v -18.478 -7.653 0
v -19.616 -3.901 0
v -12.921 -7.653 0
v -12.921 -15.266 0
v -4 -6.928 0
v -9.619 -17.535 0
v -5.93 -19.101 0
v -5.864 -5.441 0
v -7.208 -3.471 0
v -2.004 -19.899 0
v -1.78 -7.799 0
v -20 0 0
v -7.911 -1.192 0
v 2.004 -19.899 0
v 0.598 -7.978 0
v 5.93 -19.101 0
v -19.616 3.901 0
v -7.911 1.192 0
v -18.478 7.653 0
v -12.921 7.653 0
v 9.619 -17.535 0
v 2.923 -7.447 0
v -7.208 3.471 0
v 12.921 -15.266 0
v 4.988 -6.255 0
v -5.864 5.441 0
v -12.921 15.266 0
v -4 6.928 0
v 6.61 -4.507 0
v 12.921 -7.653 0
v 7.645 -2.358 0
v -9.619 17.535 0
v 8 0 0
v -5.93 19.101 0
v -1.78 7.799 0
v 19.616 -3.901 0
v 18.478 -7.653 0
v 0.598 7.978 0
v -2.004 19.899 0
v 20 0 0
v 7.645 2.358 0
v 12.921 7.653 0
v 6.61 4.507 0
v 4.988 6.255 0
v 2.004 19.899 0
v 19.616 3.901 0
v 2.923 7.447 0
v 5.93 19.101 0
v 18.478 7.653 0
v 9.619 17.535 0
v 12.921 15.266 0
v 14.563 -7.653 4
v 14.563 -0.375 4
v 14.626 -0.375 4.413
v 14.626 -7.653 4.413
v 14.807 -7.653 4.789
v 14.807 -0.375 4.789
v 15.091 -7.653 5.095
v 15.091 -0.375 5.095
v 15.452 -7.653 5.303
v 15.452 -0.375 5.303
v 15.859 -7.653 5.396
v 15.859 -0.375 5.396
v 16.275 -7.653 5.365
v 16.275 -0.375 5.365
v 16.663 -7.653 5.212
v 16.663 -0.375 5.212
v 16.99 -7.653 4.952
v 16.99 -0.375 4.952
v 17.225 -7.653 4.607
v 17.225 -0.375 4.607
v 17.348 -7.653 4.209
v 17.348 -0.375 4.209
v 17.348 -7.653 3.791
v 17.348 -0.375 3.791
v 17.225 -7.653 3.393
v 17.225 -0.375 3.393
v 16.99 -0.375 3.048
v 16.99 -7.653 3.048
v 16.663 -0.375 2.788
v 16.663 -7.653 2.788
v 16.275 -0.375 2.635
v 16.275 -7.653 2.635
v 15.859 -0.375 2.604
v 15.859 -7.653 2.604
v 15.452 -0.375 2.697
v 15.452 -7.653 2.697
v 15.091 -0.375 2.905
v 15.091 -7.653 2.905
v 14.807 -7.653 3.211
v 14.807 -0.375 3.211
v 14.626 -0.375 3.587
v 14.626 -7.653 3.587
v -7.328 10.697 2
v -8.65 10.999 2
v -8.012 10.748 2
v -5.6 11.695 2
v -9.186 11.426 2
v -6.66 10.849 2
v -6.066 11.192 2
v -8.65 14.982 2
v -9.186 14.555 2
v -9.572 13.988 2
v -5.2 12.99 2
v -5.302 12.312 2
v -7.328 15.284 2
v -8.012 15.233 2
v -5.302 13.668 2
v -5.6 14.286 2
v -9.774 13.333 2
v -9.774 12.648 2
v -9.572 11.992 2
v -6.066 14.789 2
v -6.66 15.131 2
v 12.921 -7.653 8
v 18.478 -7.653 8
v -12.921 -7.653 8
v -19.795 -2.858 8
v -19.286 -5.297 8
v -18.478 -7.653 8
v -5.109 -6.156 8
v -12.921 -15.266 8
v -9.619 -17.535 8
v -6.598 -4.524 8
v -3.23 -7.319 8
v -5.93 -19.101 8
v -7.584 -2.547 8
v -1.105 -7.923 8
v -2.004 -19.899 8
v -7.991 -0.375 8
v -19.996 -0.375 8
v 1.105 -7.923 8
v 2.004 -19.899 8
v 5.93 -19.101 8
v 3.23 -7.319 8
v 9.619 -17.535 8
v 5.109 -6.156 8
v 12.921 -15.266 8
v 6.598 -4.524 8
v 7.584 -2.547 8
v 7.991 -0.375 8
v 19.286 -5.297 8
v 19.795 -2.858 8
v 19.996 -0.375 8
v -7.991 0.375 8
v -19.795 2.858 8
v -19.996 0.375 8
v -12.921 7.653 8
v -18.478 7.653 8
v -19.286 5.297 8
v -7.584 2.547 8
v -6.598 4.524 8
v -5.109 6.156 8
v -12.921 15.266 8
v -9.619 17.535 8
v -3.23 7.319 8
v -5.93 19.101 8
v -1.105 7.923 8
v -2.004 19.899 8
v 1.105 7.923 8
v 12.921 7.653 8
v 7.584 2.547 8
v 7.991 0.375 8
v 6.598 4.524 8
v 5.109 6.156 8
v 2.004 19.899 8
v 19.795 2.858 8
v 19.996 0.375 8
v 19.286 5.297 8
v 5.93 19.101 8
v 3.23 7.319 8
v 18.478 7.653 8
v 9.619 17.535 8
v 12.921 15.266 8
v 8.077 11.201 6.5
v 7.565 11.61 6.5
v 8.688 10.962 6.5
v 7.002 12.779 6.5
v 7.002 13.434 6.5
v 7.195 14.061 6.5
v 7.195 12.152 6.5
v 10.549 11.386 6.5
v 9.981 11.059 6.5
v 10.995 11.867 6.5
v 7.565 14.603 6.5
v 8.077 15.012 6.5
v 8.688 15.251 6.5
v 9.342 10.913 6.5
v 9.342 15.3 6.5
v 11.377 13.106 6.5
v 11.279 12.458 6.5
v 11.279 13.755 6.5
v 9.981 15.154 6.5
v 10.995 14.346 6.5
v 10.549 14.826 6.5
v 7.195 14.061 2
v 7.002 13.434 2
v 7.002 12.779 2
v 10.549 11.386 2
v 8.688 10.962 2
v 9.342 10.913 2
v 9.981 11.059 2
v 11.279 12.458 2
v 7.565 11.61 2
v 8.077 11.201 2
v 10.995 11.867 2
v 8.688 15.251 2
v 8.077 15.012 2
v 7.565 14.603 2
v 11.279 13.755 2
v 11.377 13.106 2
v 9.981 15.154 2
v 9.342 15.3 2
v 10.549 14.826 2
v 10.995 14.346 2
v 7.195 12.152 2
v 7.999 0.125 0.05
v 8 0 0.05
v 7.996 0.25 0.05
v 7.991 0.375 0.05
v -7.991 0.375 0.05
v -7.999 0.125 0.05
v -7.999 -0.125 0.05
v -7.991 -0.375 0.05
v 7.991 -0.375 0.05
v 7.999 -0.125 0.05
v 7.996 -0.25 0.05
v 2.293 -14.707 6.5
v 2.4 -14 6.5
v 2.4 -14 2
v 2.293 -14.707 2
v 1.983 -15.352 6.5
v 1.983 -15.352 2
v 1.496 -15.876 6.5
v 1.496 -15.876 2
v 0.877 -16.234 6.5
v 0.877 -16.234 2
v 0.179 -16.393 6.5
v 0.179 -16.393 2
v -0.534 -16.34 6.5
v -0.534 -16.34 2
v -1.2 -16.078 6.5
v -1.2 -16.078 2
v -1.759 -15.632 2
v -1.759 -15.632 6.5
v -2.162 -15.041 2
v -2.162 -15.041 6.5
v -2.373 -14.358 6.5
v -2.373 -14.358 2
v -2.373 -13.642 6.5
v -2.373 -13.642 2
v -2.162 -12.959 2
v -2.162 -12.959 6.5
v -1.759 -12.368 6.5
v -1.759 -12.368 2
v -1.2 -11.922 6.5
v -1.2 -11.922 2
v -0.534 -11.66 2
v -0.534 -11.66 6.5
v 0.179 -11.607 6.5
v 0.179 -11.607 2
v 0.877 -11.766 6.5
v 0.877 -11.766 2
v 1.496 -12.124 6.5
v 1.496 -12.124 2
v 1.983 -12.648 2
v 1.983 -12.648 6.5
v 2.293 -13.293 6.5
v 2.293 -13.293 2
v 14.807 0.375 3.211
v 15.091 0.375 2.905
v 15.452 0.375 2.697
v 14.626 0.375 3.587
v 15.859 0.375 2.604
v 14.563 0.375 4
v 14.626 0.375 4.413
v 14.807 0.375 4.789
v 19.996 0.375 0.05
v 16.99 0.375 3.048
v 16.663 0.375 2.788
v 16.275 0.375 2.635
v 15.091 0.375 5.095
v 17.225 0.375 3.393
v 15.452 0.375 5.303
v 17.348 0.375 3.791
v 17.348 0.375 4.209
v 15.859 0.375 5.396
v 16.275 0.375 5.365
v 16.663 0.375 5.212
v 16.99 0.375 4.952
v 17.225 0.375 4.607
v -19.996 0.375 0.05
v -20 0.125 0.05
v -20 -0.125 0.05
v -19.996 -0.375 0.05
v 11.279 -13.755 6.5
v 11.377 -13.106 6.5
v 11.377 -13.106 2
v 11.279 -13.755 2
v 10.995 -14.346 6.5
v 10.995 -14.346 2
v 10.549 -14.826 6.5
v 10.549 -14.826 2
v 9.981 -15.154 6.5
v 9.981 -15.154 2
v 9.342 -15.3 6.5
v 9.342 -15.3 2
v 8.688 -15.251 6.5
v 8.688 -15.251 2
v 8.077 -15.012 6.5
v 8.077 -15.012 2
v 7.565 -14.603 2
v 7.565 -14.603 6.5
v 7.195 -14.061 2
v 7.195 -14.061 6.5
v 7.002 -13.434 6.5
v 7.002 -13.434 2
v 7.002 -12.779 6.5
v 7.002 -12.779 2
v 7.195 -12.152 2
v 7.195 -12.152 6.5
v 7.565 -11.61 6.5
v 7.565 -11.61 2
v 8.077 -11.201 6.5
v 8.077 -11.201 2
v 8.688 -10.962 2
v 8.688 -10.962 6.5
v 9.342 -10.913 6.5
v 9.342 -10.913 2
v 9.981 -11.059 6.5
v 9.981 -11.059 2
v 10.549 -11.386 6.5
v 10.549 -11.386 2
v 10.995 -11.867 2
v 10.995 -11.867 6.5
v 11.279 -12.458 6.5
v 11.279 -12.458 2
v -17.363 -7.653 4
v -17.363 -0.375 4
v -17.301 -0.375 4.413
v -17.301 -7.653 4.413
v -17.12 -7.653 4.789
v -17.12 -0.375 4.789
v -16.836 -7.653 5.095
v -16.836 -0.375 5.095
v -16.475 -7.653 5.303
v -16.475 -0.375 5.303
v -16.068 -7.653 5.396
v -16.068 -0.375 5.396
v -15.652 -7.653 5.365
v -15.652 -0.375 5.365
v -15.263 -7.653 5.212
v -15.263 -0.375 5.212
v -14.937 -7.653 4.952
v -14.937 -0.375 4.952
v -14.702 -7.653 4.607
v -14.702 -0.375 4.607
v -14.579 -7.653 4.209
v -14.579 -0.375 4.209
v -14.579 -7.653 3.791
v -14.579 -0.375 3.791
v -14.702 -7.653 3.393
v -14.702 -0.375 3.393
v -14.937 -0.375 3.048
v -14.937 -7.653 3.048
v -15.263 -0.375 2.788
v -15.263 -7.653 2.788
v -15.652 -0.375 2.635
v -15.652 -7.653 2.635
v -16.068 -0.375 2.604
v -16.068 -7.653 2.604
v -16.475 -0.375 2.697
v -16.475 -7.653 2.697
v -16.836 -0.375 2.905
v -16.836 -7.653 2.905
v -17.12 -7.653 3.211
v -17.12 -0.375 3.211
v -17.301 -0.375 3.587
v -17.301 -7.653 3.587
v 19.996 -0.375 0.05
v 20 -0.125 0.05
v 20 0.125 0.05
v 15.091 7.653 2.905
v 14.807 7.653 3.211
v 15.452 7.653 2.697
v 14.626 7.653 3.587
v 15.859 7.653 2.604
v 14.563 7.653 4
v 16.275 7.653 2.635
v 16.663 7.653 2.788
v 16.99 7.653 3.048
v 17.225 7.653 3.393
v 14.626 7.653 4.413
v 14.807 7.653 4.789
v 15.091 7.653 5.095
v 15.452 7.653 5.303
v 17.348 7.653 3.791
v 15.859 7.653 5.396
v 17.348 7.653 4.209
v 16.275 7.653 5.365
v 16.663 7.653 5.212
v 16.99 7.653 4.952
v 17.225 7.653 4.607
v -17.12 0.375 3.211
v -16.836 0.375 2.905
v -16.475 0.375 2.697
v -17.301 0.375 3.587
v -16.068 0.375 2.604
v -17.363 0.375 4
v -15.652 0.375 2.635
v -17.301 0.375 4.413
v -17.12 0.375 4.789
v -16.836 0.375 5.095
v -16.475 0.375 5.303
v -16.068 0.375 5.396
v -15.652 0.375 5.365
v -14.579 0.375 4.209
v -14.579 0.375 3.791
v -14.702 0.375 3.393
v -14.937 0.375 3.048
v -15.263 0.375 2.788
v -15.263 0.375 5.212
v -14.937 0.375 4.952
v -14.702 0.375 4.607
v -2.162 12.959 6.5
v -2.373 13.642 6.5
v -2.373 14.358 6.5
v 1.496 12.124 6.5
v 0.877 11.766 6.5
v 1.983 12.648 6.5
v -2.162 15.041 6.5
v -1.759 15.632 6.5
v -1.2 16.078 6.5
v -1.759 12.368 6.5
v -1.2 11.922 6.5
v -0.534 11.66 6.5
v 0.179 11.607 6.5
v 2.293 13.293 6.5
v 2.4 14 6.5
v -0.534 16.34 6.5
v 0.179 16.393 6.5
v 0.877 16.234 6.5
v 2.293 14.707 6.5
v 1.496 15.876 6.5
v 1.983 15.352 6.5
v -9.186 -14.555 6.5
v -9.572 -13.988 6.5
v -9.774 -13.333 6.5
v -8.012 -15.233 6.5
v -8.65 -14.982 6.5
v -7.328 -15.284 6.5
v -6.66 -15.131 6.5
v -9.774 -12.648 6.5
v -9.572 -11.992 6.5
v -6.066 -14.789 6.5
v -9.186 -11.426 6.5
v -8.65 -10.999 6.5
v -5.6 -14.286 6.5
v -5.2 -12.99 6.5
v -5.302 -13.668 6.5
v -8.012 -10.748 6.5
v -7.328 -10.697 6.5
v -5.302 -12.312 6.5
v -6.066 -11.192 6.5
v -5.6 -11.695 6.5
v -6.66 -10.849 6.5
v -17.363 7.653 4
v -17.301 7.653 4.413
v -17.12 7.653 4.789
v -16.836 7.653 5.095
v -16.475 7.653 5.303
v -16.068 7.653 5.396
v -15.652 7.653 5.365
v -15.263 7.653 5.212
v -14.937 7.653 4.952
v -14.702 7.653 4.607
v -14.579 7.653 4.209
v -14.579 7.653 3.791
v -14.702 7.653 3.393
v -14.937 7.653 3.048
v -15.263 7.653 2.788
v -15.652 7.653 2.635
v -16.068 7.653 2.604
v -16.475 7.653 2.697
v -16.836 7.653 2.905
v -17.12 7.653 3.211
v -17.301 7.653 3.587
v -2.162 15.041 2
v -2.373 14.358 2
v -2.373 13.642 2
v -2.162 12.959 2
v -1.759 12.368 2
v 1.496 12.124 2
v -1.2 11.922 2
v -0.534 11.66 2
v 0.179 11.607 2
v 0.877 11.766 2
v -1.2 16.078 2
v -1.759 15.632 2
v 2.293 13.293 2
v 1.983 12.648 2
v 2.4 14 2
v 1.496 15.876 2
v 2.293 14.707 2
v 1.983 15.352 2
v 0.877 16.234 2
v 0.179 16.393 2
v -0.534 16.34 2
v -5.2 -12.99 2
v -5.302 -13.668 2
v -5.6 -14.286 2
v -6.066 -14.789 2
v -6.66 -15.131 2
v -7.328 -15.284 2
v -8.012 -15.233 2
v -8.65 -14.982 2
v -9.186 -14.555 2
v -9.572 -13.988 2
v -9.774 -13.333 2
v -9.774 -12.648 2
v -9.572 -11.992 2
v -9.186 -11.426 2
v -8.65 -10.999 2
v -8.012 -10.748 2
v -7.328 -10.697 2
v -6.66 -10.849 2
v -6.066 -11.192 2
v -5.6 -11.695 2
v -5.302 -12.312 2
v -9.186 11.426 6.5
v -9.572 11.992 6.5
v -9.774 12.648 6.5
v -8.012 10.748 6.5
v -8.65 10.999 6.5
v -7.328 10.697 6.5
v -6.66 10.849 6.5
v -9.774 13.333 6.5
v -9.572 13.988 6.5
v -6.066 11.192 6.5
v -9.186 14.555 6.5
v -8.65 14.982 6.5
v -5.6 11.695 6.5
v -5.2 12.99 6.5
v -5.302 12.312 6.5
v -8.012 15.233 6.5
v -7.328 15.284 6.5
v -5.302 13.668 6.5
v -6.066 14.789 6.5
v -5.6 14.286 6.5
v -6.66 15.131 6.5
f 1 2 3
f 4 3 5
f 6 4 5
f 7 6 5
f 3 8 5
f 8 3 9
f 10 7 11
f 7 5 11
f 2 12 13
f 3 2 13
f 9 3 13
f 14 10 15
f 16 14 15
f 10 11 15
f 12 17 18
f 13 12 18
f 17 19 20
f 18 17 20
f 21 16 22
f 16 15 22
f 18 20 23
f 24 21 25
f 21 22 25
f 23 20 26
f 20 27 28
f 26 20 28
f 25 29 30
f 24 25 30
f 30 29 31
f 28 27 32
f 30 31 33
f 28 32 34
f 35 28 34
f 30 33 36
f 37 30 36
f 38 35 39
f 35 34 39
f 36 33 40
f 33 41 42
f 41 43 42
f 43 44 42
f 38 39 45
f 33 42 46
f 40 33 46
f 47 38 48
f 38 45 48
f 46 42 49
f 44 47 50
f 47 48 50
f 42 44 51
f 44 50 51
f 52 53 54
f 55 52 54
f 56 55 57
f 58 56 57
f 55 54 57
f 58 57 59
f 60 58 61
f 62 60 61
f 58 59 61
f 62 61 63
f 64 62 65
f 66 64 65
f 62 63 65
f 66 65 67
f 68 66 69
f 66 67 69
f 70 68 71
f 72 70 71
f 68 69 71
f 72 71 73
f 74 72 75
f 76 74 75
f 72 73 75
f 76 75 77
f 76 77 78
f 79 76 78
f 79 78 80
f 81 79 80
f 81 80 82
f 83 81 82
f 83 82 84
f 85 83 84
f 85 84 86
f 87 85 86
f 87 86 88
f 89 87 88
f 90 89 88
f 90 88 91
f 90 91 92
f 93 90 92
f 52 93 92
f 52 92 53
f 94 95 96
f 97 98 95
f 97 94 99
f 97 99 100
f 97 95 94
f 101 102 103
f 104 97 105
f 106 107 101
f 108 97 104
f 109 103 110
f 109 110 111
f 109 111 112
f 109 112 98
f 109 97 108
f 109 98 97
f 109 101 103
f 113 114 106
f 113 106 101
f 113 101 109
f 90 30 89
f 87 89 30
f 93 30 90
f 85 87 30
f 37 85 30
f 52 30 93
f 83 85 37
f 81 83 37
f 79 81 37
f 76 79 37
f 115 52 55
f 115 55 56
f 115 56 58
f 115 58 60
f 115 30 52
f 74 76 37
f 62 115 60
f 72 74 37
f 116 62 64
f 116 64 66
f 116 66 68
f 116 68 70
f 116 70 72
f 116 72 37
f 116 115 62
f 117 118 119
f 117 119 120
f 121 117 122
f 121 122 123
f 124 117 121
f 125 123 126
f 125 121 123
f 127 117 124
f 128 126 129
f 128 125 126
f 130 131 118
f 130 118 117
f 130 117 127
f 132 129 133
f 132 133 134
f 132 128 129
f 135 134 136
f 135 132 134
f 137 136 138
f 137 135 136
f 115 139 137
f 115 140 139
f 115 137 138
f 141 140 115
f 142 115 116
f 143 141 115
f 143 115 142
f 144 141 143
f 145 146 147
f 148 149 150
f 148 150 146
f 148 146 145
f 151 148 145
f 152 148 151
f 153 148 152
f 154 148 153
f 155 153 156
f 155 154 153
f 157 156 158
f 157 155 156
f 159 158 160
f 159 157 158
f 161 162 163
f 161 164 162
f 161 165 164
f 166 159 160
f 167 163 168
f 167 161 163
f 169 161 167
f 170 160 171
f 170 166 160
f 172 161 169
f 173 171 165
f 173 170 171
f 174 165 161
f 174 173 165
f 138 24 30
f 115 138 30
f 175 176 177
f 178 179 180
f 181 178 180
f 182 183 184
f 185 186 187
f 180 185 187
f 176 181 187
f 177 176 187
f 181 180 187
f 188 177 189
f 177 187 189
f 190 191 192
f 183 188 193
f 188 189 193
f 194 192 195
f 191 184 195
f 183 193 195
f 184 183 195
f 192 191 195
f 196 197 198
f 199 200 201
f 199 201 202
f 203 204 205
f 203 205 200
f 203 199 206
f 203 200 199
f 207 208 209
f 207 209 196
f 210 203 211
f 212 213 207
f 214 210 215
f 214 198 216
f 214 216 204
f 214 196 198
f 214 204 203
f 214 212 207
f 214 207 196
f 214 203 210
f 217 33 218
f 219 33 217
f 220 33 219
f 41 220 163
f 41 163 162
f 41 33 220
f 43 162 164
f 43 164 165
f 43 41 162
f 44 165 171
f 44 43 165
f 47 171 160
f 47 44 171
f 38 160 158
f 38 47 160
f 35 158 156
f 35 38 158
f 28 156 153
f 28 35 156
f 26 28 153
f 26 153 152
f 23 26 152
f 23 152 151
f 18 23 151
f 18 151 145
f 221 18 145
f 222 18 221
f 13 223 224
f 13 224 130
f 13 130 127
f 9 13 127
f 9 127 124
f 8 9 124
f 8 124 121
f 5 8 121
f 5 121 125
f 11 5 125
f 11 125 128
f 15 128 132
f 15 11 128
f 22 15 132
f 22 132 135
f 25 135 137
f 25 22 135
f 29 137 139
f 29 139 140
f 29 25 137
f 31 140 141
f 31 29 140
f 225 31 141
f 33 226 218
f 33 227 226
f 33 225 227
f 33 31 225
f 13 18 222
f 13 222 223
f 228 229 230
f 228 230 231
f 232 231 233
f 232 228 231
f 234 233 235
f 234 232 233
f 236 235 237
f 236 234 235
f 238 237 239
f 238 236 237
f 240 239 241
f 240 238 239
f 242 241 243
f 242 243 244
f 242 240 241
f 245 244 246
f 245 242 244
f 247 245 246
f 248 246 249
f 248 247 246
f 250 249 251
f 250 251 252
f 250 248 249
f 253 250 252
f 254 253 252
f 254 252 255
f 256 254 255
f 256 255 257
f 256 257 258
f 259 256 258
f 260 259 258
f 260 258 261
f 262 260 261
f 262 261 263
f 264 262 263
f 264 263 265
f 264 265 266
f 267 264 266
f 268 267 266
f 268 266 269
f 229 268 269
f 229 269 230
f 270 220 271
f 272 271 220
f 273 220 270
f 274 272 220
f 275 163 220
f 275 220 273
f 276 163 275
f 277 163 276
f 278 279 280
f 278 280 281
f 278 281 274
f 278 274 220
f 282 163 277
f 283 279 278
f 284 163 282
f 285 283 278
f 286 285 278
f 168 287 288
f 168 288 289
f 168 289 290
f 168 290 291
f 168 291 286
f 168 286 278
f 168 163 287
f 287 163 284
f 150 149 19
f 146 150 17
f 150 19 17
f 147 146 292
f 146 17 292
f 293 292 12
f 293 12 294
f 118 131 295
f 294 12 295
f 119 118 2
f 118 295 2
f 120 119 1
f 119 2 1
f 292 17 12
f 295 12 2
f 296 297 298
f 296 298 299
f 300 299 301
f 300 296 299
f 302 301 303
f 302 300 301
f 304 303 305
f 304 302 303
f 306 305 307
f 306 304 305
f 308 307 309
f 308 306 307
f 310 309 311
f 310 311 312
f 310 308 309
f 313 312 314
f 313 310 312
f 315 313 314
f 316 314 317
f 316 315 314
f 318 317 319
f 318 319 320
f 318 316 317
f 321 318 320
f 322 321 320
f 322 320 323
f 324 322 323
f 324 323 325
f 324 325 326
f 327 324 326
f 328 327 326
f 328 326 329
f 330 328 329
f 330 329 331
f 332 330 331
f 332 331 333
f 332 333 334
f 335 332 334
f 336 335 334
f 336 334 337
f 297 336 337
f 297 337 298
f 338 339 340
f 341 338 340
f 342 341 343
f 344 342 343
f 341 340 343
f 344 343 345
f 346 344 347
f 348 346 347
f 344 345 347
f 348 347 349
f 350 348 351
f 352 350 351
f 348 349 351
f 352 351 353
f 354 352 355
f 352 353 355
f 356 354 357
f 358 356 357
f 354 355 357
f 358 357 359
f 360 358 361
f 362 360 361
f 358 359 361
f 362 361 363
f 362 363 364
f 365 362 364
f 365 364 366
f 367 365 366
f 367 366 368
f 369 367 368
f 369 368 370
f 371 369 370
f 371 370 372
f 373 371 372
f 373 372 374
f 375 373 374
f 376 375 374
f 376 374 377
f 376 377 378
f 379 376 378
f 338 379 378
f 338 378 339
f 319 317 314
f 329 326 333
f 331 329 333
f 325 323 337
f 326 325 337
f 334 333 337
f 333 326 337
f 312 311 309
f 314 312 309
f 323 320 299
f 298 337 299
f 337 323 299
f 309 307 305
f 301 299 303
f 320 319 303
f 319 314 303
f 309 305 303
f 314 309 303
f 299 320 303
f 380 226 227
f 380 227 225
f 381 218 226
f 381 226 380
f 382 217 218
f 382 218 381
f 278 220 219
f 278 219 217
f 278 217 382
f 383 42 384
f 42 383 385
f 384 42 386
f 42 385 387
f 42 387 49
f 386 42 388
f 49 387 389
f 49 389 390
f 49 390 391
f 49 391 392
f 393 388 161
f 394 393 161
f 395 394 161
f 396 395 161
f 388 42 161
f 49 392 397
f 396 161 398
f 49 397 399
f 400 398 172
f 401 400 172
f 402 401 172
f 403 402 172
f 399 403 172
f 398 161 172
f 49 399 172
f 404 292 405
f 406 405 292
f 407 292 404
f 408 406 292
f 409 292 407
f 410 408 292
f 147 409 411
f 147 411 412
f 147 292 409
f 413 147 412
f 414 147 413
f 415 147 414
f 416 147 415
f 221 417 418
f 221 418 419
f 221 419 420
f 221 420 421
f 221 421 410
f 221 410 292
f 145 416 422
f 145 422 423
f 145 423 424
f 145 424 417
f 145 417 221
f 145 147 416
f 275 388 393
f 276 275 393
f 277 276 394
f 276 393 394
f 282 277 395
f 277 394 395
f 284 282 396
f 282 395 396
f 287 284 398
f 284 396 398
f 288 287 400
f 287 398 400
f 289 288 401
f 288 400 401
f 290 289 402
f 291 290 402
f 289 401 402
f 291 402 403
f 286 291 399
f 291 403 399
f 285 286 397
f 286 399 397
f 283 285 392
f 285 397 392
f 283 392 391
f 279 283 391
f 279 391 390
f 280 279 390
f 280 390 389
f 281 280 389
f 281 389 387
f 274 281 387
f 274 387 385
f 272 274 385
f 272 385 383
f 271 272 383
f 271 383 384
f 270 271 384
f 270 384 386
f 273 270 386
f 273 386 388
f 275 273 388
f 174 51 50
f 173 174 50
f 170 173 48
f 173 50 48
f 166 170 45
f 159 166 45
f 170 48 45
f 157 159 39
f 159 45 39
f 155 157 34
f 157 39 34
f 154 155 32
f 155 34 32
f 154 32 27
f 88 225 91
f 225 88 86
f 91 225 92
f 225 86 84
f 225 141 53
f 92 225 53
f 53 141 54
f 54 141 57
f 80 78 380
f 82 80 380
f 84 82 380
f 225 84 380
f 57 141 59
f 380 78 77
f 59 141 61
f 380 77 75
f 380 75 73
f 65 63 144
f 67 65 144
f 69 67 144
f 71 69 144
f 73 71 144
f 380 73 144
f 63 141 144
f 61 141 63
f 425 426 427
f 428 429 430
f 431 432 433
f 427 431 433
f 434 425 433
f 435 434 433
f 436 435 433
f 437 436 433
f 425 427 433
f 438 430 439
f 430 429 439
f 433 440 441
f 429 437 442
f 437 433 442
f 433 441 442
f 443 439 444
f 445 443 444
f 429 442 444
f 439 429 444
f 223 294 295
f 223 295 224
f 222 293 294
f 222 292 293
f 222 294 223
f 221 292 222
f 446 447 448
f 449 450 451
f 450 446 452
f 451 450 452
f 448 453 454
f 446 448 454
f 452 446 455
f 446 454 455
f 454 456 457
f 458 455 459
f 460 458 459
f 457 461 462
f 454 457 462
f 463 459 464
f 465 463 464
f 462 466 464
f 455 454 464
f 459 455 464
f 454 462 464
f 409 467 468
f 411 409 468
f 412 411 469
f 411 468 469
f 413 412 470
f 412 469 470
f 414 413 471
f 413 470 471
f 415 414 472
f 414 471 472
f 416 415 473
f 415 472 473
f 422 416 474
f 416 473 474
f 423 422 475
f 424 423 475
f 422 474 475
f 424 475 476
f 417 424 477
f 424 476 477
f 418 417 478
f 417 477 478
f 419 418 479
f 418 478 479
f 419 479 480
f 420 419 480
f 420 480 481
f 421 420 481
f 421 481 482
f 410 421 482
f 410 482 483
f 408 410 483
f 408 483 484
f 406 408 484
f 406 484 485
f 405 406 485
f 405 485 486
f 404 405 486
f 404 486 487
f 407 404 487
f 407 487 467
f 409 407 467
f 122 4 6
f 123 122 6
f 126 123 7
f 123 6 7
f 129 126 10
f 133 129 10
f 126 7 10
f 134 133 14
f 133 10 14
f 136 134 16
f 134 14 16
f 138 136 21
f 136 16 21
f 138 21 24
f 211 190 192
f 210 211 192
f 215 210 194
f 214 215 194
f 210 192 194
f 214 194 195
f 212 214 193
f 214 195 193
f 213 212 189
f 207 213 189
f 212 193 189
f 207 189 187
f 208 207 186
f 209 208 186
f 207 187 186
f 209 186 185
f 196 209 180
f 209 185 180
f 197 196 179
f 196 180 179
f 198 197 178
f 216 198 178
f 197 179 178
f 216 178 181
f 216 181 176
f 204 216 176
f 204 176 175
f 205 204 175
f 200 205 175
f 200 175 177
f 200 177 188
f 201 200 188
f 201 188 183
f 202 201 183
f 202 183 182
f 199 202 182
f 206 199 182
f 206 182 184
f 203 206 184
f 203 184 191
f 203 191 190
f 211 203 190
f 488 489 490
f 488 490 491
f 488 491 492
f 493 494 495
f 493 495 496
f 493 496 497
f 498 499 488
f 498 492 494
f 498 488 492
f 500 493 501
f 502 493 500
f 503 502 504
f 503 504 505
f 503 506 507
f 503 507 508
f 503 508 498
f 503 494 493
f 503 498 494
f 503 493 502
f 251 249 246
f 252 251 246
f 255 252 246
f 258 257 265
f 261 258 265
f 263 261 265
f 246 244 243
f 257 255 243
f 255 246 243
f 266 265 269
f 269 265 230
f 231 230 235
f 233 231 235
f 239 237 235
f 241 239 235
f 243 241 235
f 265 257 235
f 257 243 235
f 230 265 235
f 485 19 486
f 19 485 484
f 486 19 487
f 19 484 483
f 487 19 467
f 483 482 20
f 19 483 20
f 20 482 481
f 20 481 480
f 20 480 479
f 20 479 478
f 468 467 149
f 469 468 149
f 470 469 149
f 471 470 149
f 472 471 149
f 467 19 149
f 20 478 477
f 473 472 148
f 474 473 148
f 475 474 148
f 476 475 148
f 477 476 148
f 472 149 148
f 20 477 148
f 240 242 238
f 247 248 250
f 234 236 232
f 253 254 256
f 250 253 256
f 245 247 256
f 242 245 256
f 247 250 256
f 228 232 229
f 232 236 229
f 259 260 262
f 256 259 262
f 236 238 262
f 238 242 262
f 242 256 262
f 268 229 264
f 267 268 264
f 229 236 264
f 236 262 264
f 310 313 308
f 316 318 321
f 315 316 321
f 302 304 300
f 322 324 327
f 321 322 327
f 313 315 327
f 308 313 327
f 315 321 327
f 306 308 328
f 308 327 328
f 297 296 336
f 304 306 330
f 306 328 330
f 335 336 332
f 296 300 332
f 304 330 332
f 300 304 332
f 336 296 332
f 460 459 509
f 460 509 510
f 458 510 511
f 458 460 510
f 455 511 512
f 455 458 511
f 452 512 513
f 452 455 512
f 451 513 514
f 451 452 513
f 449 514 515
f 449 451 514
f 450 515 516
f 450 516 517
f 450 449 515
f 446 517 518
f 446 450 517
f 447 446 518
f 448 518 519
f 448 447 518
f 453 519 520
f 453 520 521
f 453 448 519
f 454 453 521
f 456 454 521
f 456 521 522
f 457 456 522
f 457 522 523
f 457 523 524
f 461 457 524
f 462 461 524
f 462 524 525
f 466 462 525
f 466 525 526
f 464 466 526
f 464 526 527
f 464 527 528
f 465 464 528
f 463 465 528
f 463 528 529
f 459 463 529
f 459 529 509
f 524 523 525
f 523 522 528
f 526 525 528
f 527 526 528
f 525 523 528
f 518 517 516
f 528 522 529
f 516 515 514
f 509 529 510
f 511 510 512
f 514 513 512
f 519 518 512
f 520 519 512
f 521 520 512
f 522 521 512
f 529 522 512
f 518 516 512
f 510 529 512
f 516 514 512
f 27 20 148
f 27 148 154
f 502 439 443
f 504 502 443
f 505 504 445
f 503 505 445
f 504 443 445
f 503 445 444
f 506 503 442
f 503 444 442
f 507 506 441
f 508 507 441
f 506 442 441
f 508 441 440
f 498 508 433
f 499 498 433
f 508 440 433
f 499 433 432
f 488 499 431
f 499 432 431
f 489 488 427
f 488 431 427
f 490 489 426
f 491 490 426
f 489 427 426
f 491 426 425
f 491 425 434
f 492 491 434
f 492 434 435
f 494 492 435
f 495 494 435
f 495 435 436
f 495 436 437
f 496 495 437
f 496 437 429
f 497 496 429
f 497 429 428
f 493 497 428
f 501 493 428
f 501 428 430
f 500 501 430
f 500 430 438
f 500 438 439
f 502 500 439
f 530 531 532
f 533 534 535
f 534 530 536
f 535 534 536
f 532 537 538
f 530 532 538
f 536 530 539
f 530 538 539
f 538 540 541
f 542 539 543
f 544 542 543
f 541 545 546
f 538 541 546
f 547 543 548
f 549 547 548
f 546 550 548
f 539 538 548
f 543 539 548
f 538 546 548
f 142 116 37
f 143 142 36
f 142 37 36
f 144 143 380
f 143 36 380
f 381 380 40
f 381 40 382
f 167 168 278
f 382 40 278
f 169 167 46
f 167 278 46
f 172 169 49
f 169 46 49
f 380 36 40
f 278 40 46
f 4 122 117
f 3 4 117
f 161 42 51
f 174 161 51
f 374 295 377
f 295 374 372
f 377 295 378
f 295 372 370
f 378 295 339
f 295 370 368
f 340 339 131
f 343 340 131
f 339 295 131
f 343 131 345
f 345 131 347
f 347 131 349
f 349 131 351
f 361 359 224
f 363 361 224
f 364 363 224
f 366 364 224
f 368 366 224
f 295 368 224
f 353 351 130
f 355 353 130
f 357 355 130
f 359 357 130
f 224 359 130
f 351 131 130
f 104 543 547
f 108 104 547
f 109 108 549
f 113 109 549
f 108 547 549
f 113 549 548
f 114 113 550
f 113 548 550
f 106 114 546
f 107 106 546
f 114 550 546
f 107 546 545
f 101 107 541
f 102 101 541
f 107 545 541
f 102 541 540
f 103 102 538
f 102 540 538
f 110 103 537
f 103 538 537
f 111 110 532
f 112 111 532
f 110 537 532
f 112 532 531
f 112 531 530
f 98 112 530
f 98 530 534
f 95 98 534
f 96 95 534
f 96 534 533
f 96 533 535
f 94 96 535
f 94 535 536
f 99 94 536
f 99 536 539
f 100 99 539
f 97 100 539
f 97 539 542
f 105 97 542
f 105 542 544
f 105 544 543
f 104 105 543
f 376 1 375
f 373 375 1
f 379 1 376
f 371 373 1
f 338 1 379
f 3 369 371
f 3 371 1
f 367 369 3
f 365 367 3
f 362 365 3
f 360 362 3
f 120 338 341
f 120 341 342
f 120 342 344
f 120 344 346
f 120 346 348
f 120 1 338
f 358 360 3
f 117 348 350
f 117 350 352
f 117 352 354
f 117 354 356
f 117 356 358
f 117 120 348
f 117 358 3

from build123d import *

# Parameters (mm, degrees)
SKETCH_R        = 20
SKETCH_R_2      = 8
PAD_DEPTH       = 8
SKETCH001_R     = 2.4
SKETCH001_R_2   = 2.3
SKETCH001_R_3   = 1.630743
SKETCH001_R_4   = 1.492514
SKETCH001_R_5   = 2.2
SKETCH001_R_6   = 1.821083
POCKET_DEPTH    = 6
SKETCH002_R     = 19.1322603564
SKETCH002_R_2   = 8.424409
PAD001_DEPTH    = 1.5
SKETCH003_W     = 43.022533
SKETCH003_H     = 0.75
POCKET001_DEPTH = 7.95
SKETCH007_W     = 7.6375744751
SKETCH007_H     = 10.86069433
SKETCH007_W_2   = 8.2446434751
SKETCH007_H_2   = 12.05515533
SKETCH007_W_3   = 8.5299164751
SKETCH007_H_3   = 10.94123533
SKETCH007_W_4   = 11.8328734751
SKETCH007_H_4   = 10.66832833
POCKET002_DEPTH = 8.001
SKETCH008_R     = 1.4
POCKET003_DEPTH = 27.65392667


with BuildPart() as part:
    # Sketch → Pad (new body)
    with BuildSketch(Plane.XY):
        Circle(SKETCH_R)
        Circle(SKETCH_R_2, mode=Mode.SUBTRACT)
    extrude(amount=PAD_DEPTH)

    # Sketch001 (on Face4 of Pad) → Pocket (cut)
    with BuildSketch(Plane.XY.offset(8)):
        with Locations((0, 14)):
            Circle(SKETCH001_R)
        with Locations((-7.5, 12.9903810568)):
            Circle(SKETCH001_R_2)
        with Locations((-17.083683, 37.568653)):
            Circle(SKETCH001_R_3)
        with Locations((9.573956, 39.229813)):
            Circle(SKETCH001_R_4)
        with Locations((9.1772229816, 13.1064327086)):
            Circle(SKETCH001_R_5)
        with Locations((30.140682, 32.901588)):
            Circle(SKETCH001_R_6)
    pocket = extrude(amount=-POCKET_DEPTH, mode=Mode.SUBTRACT)

    # Mirrored: Pocket across Sketch001 H_Axis
    add(pocket.mirror(Plane(origin=(0, 0, 8), x_dir=(0, 0, 1), z_dir=(0, 1, 0))), mode=Mode.SUBTRACT)

    # Sketch002 → Pad001 (join)
    with BuildSketch(Plane.XY.offset(8)):
        Circle(SKETCH002_R)
        Circle(SKETCH002_R_2, mode=Mode.SUBTRACT)
    extrude(amount=-PAD001_DEPTH)

    # Sketch003 → Pocket001 (cut)
    with BuildSketch(Plane.XY.offset(8)):
        with Locations((-0.7364995, 0)):
            Rectangle(SKETCH003_W, SKETCH003_H)
    extrude(amount=-POCKET001_DEPTH, mode=Mode.SUBTRACT)

    # Sketch007 → Pocket002 (cut, through all)
    with BuildSketch(Plane.XY.offset(8)):
        with Locations((-16.7398847624, -13.083273835)):
            Rectangle(SKETCH007_W, SKETCH007_H)
        with Locations((-17.0434192624, 13.680504335)):
            Rectangle(SKETCH007_W_2, SKETCH007_H_2)
        with Locations((17.1860557624, 13.123544335)):
            Rectangle(SKETCH007_W_3, SKETCH007_H_3)
        with Locations((18.8375342624, -12.987090835)):
            Rectangle(SKETCH007_W_4, SKETCH007_H_4)
    extrude(amount=-POCKET002_DEPTH, mode=Mode.SUBTRACT)

    # Sketch008 (on Face19 of Pocket002) → Pocket003 (cut, through all)
    with BuildSketch(Plane(origin=(0, 7.65292667, 0), x_dir=(-1, 0, 0), z_dir=(0, 1, 0))):
        with Locations((-15.963433, 4)):
            Circle(SKETCH008_R)
        with Locations((15.963433, 4)):
            Circle(SKETCH008_R)
    extrude(amount=-POCKET003_DEPTH, mode=Mode.SUBTRACT)


solid = part.part
